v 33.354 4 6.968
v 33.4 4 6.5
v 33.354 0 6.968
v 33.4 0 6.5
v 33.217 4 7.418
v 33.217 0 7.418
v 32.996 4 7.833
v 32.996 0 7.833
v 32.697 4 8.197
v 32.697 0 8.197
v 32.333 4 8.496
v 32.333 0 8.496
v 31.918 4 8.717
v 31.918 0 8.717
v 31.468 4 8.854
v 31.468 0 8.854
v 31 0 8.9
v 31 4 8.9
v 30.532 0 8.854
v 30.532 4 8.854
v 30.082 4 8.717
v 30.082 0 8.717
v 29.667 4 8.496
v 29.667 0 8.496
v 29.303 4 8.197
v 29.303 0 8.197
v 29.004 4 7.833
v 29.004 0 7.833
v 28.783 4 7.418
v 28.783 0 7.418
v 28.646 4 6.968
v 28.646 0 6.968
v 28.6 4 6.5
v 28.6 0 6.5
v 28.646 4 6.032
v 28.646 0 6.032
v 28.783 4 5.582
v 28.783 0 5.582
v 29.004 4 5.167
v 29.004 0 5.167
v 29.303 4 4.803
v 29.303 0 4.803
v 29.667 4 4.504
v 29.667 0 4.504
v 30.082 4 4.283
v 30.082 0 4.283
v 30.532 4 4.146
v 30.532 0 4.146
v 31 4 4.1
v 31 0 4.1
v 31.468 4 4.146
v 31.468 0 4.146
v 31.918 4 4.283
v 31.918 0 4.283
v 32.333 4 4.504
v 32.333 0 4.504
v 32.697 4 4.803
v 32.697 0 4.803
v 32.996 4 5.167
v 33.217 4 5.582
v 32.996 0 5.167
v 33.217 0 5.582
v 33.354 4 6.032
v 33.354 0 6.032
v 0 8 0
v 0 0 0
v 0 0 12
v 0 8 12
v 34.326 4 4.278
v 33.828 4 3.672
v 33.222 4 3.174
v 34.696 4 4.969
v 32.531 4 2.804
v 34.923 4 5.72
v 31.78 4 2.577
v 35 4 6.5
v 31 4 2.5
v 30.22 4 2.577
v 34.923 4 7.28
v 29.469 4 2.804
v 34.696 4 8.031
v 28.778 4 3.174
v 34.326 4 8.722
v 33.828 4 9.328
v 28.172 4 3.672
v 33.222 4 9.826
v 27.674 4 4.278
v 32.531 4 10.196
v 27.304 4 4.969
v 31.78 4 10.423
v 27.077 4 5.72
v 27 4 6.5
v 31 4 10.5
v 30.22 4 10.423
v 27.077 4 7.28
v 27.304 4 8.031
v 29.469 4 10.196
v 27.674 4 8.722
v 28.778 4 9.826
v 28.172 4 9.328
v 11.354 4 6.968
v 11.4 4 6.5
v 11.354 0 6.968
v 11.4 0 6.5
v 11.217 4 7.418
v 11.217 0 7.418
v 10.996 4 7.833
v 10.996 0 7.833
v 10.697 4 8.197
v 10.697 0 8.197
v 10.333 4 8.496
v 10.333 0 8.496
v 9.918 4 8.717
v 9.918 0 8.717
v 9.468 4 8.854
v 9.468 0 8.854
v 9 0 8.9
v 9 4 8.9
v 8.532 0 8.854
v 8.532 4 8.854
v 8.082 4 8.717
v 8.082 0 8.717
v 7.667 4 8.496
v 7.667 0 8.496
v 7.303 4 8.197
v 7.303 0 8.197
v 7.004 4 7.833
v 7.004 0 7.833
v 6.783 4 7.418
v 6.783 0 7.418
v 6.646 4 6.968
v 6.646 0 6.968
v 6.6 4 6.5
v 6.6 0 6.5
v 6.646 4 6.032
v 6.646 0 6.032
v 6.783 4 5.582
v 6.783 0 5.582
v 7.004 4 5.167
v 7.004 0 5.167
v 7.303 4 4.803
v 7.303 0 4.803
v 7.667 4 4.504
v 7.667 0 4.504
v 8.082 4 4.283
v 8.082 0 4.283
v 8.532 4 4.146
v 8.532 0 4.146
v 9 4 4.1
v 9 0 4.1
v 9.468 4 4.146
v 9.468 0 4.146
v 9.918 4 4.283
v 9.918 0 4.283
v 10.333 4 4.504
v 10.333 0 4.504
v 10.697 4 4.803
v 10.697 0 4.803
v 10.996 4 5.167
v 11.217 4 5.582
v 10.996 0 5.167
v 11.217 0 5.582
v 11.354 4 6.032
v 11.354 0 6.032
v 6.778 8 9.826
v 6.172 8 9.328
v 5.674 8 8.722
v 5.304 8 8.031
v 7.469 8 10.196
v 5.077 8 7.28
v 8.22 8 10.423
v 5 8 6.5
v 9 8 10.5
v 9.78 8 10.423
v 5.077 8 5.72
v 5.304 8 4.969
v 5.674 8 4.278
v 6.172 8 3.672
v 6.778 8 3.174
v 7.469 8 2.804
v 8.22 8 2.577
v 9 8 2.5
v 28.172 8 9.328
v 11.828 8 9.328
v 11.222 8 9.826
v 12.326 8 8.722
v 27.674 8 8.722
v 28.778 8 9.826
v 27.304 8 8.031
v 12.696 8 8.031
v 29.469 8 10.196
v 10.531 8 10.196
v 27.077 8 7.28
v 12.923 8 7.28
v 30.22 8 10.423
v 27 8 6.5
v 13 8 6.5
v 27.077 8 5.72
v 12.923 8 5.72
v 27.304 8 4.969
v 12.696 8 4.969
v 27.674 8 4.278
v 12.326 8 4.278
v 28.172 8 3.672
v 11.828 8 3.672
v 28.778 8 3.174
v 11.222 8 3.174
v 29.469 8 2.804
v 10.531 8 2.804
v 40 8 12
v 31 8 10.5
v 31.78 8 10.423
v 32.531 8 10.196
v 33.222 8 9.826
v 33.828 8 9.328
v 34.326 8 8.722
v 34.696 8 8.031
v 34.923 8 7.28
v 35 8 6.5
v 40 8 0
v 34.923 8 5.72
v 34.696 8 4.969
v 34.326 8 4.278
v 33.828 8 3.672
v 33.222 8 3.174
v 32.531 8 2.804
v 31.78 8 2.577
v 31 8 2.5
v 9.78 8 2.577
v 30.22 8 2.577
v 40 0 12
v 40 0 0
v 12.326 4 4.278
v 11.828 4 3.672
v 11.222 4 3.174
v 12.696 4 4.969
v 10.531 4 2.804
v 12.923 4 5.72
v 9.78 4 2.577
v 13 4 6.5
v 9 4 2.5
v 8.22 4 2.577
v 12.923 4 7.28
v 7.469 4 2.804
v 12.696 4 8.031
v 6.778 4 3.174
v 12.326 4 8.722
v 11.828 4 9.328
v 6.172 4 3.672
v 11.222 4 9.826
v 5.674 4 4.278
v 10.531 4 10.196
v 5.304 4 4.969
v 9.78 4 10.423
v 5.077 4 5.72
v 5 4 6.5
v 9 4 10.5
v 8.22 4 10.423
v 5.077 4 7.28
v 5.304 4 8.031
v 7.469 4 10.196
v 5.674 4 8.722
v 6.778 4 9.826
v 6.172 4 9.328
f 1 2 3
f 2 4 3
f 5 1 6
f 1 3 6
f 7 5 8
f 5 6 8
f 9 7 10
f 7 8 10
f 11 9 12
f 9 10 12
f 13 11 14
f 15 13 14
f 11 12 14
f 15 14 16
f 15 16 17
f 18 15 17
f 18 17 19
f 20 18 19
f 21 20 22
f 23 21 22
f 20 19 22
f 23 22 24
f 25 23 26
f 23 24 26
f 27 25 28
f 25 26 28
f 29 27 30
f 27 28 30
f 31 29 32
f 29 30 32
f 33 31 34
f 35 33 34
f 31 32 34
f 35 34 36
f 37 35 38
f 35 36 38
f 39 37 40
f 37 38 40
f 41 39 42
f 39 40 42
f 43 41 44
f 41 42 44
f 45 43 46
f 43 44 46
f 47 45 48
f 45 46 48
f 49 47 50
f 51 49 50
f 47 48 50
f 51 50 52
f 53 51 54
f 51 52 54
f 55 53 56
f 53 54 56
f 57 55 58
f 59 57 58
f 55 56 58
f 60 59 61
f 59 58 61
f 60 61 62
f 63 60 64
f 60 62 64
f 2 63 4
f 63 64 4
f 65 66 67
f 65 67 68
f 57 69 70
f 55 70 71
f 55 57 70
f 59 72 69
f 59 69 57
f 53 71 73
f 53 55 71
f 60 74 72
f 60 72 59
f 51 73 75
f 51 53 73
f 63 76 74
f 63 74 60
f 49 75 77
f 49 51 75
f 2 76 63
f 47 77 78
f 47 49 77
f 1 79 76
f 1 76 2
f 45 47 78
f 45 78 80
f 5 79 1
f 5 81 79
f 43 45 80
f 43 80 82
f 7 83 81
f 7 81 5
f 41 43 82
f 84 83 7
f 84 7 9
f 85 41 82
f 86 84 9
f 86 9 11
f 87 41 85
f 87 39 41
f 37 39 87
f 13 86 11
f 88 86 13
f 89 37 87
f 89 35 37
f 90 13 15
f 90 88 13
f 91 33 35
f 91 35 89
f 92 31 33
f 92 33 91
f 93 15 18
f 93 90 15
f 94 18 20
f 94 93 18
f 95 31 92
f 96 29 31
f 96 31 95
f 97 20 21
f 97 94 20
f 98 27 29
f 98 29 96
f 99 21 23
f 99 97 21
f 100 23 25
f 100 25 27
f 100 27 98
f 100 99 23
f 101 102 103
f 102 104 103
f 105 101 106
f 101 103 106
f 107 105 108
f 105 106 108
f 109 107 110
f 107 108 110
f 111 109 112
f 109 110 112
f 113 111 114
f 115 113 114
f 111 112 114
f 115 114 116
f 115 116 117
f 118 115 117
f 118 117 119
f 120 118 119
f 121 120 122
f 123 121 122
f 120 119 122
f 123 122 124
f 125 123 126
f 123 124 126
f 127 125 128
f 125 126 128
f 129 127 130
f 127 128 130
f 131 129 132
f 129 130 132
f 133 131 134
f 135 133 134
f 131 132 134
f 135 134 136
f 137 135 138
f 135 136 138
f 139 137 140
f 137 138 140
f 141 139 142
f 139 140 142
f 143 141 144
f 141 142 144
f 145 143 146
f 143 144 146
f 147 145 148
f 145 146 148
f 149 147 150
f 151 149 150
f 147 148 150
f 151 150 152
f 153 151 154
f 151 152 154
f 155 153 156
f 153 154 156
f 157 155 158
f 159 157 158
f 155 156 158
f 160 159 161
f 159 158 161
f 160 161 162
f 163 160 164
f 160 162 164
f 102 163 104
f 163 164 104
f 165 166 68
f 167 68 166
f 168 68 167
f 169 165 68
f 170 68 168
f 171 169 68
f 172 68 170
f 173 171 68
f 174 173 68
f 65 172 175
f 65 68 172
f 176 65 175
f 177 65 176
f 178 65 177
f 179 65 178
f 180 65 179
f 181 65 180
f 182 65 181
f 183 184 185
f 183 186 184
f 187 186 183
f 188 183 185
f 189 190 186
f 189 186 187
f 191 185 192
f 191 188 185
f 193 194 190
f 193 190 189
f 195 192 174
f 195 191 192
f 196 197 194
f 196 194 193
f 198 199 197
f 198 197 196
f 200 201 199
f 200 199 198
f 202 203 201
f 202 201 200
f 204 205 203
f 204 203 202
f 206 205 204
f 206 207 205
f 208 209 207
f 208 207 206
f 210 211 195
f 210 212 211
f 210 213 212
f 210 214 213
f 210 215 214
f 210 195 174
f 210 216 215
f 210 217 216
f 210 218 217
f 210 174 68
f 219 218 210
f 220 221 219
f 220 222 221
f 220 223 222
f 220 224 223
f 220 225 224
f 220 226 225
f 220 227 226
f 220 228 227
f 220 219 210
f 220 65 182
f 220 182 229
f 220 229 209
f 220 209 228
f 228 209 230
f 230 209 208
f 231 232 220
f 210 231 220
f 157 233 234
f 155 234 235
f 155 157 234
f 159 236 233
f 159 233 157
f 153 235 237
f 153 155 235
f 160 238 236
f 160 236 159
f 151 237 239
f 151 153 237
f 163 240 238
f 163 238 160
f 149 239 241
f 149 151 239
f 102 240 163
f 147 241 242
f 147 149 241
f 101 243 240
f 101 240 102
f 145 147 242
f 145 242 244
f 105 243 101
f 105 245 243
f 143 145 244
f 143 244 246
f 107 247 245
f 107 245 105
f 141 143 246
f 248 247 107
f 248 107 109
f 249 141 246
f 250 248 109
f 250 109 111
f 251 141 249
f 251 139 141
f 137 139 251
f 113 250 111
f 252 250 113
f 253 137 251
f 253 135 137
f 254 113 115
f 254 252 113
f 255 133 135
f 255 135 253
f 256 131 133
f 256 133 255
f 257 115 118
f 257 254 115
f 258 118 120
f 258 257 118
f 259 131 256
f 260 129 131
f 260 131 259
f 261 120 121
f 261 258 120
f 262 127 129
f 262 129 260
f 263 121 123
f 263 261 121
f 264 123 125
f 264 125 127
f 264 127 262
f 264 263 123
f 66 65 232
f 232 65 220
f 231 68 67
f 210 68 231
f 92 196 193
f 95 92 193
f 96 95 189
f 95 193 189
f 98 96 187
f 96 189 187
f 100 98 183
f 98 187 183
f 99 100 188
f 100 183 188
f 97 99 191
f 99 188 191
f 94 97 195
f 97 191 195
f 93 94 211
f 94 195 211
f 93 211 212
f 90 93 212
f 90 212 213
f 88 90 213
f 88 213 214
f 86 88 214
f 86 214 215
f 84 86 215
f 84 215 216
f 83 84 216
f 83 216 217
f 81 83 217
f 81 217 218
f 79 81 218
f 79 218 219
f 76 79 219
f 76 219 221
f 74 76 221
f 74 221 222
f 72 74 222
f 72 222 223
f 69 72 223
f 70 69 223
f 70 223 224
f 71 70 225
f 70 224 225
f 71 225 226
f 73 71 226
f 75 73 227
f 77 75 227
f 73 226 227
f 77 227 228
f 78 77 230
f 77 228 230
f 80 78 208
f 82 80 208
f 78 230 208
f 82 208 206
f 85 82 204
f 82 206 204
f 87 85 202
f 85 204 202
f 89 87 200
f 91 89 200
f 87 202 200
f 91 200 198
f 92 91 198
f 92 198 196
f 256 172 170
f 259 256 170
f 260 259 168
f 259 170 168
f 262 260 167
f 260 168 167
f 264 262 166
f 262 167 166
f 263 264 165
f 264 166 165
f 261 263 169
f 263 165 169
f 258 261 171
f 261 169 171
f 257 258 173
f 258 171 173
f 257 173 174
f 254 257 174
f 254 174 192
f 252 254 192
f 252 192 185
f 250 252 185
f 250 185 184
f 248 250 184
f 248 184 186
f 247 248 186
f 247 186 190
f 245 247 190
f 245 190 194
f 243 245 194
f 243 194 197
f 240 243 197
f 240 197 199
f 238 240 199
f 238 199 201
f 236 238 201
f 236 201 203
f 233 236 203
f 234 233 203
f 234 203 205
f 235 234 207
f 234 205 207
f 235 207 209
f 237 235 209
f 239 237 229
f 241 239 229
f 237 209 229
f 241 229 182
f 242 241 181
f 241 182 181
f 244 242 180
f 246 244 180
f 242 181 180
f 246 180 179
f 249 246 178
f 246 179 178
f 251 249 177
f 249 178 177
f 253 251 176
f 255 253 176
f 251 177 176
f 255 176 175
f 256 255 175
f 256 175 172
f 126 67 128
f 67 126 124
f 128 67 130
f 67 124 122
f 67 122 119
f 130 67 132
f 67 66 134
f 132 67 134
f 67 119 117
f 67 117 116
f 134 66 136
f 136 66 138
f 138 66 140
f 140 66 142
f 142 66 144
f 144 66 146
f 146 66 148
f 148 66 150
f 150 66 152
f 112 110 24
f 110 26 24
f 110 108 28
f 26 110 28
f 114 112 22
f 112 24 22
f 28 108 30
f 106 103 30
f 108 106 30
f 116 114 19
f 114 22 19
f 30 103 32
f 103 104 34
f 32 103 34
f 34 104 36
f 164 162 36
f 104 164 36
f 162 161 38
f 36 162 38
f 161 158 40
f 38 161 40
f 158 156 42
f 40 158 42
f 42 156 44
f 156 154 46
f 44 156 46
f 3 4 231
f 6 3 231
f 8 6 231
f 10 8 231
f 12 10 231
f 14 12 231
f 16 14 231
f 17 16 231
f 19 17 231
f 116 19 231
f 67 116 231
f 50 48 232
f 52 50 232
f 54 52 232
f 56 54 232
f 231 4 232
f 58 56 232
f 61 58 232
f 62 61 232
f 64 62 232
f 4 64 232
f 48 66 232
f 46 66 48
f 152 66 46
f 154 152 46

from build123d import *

# Parameters (mm, degrees)
SKETCH_1_W                   = 40
SKETCH_1_H                   = 8
EXTRUDE_1_DEPTH              = 12
HOLE_WIZARD_M4_3_D           = 4.8
HOLE_WIZARD_M4_3_CBORE_D     = 8
HOLE_WIZARD_M4_3_CBORE_DEPTH = 4


with BuildPart() as part:
    # 草图1 → 凸台-拉伸1 (new body)
    with BuildSketch(Plane.XY):
        with Locations((20, 4)):
            Rectangle(SKETCH_1_W, SKETCH_1_H)
    extrude(amount=EXTRUDE_1_DEPTH)

    # M4 六角凹头螺钉的柱形沉头孔3 (through all)
    with Locations(Plane(origin=(0, 8, 0), x_dir=(-1, 0, 0), z_dir=(0, 1, 0))):
        with Locations((-9, 6.5), (-31, 6.5)):
            CounterBoreHole(HOLE_WIZARD_M4_3_D / 2, HOLE_WIZARD_M4_3_CBORE_D / 2, HOLE_WIZARD_M4_3_CBORE_DEPTH)


solid = part.part
